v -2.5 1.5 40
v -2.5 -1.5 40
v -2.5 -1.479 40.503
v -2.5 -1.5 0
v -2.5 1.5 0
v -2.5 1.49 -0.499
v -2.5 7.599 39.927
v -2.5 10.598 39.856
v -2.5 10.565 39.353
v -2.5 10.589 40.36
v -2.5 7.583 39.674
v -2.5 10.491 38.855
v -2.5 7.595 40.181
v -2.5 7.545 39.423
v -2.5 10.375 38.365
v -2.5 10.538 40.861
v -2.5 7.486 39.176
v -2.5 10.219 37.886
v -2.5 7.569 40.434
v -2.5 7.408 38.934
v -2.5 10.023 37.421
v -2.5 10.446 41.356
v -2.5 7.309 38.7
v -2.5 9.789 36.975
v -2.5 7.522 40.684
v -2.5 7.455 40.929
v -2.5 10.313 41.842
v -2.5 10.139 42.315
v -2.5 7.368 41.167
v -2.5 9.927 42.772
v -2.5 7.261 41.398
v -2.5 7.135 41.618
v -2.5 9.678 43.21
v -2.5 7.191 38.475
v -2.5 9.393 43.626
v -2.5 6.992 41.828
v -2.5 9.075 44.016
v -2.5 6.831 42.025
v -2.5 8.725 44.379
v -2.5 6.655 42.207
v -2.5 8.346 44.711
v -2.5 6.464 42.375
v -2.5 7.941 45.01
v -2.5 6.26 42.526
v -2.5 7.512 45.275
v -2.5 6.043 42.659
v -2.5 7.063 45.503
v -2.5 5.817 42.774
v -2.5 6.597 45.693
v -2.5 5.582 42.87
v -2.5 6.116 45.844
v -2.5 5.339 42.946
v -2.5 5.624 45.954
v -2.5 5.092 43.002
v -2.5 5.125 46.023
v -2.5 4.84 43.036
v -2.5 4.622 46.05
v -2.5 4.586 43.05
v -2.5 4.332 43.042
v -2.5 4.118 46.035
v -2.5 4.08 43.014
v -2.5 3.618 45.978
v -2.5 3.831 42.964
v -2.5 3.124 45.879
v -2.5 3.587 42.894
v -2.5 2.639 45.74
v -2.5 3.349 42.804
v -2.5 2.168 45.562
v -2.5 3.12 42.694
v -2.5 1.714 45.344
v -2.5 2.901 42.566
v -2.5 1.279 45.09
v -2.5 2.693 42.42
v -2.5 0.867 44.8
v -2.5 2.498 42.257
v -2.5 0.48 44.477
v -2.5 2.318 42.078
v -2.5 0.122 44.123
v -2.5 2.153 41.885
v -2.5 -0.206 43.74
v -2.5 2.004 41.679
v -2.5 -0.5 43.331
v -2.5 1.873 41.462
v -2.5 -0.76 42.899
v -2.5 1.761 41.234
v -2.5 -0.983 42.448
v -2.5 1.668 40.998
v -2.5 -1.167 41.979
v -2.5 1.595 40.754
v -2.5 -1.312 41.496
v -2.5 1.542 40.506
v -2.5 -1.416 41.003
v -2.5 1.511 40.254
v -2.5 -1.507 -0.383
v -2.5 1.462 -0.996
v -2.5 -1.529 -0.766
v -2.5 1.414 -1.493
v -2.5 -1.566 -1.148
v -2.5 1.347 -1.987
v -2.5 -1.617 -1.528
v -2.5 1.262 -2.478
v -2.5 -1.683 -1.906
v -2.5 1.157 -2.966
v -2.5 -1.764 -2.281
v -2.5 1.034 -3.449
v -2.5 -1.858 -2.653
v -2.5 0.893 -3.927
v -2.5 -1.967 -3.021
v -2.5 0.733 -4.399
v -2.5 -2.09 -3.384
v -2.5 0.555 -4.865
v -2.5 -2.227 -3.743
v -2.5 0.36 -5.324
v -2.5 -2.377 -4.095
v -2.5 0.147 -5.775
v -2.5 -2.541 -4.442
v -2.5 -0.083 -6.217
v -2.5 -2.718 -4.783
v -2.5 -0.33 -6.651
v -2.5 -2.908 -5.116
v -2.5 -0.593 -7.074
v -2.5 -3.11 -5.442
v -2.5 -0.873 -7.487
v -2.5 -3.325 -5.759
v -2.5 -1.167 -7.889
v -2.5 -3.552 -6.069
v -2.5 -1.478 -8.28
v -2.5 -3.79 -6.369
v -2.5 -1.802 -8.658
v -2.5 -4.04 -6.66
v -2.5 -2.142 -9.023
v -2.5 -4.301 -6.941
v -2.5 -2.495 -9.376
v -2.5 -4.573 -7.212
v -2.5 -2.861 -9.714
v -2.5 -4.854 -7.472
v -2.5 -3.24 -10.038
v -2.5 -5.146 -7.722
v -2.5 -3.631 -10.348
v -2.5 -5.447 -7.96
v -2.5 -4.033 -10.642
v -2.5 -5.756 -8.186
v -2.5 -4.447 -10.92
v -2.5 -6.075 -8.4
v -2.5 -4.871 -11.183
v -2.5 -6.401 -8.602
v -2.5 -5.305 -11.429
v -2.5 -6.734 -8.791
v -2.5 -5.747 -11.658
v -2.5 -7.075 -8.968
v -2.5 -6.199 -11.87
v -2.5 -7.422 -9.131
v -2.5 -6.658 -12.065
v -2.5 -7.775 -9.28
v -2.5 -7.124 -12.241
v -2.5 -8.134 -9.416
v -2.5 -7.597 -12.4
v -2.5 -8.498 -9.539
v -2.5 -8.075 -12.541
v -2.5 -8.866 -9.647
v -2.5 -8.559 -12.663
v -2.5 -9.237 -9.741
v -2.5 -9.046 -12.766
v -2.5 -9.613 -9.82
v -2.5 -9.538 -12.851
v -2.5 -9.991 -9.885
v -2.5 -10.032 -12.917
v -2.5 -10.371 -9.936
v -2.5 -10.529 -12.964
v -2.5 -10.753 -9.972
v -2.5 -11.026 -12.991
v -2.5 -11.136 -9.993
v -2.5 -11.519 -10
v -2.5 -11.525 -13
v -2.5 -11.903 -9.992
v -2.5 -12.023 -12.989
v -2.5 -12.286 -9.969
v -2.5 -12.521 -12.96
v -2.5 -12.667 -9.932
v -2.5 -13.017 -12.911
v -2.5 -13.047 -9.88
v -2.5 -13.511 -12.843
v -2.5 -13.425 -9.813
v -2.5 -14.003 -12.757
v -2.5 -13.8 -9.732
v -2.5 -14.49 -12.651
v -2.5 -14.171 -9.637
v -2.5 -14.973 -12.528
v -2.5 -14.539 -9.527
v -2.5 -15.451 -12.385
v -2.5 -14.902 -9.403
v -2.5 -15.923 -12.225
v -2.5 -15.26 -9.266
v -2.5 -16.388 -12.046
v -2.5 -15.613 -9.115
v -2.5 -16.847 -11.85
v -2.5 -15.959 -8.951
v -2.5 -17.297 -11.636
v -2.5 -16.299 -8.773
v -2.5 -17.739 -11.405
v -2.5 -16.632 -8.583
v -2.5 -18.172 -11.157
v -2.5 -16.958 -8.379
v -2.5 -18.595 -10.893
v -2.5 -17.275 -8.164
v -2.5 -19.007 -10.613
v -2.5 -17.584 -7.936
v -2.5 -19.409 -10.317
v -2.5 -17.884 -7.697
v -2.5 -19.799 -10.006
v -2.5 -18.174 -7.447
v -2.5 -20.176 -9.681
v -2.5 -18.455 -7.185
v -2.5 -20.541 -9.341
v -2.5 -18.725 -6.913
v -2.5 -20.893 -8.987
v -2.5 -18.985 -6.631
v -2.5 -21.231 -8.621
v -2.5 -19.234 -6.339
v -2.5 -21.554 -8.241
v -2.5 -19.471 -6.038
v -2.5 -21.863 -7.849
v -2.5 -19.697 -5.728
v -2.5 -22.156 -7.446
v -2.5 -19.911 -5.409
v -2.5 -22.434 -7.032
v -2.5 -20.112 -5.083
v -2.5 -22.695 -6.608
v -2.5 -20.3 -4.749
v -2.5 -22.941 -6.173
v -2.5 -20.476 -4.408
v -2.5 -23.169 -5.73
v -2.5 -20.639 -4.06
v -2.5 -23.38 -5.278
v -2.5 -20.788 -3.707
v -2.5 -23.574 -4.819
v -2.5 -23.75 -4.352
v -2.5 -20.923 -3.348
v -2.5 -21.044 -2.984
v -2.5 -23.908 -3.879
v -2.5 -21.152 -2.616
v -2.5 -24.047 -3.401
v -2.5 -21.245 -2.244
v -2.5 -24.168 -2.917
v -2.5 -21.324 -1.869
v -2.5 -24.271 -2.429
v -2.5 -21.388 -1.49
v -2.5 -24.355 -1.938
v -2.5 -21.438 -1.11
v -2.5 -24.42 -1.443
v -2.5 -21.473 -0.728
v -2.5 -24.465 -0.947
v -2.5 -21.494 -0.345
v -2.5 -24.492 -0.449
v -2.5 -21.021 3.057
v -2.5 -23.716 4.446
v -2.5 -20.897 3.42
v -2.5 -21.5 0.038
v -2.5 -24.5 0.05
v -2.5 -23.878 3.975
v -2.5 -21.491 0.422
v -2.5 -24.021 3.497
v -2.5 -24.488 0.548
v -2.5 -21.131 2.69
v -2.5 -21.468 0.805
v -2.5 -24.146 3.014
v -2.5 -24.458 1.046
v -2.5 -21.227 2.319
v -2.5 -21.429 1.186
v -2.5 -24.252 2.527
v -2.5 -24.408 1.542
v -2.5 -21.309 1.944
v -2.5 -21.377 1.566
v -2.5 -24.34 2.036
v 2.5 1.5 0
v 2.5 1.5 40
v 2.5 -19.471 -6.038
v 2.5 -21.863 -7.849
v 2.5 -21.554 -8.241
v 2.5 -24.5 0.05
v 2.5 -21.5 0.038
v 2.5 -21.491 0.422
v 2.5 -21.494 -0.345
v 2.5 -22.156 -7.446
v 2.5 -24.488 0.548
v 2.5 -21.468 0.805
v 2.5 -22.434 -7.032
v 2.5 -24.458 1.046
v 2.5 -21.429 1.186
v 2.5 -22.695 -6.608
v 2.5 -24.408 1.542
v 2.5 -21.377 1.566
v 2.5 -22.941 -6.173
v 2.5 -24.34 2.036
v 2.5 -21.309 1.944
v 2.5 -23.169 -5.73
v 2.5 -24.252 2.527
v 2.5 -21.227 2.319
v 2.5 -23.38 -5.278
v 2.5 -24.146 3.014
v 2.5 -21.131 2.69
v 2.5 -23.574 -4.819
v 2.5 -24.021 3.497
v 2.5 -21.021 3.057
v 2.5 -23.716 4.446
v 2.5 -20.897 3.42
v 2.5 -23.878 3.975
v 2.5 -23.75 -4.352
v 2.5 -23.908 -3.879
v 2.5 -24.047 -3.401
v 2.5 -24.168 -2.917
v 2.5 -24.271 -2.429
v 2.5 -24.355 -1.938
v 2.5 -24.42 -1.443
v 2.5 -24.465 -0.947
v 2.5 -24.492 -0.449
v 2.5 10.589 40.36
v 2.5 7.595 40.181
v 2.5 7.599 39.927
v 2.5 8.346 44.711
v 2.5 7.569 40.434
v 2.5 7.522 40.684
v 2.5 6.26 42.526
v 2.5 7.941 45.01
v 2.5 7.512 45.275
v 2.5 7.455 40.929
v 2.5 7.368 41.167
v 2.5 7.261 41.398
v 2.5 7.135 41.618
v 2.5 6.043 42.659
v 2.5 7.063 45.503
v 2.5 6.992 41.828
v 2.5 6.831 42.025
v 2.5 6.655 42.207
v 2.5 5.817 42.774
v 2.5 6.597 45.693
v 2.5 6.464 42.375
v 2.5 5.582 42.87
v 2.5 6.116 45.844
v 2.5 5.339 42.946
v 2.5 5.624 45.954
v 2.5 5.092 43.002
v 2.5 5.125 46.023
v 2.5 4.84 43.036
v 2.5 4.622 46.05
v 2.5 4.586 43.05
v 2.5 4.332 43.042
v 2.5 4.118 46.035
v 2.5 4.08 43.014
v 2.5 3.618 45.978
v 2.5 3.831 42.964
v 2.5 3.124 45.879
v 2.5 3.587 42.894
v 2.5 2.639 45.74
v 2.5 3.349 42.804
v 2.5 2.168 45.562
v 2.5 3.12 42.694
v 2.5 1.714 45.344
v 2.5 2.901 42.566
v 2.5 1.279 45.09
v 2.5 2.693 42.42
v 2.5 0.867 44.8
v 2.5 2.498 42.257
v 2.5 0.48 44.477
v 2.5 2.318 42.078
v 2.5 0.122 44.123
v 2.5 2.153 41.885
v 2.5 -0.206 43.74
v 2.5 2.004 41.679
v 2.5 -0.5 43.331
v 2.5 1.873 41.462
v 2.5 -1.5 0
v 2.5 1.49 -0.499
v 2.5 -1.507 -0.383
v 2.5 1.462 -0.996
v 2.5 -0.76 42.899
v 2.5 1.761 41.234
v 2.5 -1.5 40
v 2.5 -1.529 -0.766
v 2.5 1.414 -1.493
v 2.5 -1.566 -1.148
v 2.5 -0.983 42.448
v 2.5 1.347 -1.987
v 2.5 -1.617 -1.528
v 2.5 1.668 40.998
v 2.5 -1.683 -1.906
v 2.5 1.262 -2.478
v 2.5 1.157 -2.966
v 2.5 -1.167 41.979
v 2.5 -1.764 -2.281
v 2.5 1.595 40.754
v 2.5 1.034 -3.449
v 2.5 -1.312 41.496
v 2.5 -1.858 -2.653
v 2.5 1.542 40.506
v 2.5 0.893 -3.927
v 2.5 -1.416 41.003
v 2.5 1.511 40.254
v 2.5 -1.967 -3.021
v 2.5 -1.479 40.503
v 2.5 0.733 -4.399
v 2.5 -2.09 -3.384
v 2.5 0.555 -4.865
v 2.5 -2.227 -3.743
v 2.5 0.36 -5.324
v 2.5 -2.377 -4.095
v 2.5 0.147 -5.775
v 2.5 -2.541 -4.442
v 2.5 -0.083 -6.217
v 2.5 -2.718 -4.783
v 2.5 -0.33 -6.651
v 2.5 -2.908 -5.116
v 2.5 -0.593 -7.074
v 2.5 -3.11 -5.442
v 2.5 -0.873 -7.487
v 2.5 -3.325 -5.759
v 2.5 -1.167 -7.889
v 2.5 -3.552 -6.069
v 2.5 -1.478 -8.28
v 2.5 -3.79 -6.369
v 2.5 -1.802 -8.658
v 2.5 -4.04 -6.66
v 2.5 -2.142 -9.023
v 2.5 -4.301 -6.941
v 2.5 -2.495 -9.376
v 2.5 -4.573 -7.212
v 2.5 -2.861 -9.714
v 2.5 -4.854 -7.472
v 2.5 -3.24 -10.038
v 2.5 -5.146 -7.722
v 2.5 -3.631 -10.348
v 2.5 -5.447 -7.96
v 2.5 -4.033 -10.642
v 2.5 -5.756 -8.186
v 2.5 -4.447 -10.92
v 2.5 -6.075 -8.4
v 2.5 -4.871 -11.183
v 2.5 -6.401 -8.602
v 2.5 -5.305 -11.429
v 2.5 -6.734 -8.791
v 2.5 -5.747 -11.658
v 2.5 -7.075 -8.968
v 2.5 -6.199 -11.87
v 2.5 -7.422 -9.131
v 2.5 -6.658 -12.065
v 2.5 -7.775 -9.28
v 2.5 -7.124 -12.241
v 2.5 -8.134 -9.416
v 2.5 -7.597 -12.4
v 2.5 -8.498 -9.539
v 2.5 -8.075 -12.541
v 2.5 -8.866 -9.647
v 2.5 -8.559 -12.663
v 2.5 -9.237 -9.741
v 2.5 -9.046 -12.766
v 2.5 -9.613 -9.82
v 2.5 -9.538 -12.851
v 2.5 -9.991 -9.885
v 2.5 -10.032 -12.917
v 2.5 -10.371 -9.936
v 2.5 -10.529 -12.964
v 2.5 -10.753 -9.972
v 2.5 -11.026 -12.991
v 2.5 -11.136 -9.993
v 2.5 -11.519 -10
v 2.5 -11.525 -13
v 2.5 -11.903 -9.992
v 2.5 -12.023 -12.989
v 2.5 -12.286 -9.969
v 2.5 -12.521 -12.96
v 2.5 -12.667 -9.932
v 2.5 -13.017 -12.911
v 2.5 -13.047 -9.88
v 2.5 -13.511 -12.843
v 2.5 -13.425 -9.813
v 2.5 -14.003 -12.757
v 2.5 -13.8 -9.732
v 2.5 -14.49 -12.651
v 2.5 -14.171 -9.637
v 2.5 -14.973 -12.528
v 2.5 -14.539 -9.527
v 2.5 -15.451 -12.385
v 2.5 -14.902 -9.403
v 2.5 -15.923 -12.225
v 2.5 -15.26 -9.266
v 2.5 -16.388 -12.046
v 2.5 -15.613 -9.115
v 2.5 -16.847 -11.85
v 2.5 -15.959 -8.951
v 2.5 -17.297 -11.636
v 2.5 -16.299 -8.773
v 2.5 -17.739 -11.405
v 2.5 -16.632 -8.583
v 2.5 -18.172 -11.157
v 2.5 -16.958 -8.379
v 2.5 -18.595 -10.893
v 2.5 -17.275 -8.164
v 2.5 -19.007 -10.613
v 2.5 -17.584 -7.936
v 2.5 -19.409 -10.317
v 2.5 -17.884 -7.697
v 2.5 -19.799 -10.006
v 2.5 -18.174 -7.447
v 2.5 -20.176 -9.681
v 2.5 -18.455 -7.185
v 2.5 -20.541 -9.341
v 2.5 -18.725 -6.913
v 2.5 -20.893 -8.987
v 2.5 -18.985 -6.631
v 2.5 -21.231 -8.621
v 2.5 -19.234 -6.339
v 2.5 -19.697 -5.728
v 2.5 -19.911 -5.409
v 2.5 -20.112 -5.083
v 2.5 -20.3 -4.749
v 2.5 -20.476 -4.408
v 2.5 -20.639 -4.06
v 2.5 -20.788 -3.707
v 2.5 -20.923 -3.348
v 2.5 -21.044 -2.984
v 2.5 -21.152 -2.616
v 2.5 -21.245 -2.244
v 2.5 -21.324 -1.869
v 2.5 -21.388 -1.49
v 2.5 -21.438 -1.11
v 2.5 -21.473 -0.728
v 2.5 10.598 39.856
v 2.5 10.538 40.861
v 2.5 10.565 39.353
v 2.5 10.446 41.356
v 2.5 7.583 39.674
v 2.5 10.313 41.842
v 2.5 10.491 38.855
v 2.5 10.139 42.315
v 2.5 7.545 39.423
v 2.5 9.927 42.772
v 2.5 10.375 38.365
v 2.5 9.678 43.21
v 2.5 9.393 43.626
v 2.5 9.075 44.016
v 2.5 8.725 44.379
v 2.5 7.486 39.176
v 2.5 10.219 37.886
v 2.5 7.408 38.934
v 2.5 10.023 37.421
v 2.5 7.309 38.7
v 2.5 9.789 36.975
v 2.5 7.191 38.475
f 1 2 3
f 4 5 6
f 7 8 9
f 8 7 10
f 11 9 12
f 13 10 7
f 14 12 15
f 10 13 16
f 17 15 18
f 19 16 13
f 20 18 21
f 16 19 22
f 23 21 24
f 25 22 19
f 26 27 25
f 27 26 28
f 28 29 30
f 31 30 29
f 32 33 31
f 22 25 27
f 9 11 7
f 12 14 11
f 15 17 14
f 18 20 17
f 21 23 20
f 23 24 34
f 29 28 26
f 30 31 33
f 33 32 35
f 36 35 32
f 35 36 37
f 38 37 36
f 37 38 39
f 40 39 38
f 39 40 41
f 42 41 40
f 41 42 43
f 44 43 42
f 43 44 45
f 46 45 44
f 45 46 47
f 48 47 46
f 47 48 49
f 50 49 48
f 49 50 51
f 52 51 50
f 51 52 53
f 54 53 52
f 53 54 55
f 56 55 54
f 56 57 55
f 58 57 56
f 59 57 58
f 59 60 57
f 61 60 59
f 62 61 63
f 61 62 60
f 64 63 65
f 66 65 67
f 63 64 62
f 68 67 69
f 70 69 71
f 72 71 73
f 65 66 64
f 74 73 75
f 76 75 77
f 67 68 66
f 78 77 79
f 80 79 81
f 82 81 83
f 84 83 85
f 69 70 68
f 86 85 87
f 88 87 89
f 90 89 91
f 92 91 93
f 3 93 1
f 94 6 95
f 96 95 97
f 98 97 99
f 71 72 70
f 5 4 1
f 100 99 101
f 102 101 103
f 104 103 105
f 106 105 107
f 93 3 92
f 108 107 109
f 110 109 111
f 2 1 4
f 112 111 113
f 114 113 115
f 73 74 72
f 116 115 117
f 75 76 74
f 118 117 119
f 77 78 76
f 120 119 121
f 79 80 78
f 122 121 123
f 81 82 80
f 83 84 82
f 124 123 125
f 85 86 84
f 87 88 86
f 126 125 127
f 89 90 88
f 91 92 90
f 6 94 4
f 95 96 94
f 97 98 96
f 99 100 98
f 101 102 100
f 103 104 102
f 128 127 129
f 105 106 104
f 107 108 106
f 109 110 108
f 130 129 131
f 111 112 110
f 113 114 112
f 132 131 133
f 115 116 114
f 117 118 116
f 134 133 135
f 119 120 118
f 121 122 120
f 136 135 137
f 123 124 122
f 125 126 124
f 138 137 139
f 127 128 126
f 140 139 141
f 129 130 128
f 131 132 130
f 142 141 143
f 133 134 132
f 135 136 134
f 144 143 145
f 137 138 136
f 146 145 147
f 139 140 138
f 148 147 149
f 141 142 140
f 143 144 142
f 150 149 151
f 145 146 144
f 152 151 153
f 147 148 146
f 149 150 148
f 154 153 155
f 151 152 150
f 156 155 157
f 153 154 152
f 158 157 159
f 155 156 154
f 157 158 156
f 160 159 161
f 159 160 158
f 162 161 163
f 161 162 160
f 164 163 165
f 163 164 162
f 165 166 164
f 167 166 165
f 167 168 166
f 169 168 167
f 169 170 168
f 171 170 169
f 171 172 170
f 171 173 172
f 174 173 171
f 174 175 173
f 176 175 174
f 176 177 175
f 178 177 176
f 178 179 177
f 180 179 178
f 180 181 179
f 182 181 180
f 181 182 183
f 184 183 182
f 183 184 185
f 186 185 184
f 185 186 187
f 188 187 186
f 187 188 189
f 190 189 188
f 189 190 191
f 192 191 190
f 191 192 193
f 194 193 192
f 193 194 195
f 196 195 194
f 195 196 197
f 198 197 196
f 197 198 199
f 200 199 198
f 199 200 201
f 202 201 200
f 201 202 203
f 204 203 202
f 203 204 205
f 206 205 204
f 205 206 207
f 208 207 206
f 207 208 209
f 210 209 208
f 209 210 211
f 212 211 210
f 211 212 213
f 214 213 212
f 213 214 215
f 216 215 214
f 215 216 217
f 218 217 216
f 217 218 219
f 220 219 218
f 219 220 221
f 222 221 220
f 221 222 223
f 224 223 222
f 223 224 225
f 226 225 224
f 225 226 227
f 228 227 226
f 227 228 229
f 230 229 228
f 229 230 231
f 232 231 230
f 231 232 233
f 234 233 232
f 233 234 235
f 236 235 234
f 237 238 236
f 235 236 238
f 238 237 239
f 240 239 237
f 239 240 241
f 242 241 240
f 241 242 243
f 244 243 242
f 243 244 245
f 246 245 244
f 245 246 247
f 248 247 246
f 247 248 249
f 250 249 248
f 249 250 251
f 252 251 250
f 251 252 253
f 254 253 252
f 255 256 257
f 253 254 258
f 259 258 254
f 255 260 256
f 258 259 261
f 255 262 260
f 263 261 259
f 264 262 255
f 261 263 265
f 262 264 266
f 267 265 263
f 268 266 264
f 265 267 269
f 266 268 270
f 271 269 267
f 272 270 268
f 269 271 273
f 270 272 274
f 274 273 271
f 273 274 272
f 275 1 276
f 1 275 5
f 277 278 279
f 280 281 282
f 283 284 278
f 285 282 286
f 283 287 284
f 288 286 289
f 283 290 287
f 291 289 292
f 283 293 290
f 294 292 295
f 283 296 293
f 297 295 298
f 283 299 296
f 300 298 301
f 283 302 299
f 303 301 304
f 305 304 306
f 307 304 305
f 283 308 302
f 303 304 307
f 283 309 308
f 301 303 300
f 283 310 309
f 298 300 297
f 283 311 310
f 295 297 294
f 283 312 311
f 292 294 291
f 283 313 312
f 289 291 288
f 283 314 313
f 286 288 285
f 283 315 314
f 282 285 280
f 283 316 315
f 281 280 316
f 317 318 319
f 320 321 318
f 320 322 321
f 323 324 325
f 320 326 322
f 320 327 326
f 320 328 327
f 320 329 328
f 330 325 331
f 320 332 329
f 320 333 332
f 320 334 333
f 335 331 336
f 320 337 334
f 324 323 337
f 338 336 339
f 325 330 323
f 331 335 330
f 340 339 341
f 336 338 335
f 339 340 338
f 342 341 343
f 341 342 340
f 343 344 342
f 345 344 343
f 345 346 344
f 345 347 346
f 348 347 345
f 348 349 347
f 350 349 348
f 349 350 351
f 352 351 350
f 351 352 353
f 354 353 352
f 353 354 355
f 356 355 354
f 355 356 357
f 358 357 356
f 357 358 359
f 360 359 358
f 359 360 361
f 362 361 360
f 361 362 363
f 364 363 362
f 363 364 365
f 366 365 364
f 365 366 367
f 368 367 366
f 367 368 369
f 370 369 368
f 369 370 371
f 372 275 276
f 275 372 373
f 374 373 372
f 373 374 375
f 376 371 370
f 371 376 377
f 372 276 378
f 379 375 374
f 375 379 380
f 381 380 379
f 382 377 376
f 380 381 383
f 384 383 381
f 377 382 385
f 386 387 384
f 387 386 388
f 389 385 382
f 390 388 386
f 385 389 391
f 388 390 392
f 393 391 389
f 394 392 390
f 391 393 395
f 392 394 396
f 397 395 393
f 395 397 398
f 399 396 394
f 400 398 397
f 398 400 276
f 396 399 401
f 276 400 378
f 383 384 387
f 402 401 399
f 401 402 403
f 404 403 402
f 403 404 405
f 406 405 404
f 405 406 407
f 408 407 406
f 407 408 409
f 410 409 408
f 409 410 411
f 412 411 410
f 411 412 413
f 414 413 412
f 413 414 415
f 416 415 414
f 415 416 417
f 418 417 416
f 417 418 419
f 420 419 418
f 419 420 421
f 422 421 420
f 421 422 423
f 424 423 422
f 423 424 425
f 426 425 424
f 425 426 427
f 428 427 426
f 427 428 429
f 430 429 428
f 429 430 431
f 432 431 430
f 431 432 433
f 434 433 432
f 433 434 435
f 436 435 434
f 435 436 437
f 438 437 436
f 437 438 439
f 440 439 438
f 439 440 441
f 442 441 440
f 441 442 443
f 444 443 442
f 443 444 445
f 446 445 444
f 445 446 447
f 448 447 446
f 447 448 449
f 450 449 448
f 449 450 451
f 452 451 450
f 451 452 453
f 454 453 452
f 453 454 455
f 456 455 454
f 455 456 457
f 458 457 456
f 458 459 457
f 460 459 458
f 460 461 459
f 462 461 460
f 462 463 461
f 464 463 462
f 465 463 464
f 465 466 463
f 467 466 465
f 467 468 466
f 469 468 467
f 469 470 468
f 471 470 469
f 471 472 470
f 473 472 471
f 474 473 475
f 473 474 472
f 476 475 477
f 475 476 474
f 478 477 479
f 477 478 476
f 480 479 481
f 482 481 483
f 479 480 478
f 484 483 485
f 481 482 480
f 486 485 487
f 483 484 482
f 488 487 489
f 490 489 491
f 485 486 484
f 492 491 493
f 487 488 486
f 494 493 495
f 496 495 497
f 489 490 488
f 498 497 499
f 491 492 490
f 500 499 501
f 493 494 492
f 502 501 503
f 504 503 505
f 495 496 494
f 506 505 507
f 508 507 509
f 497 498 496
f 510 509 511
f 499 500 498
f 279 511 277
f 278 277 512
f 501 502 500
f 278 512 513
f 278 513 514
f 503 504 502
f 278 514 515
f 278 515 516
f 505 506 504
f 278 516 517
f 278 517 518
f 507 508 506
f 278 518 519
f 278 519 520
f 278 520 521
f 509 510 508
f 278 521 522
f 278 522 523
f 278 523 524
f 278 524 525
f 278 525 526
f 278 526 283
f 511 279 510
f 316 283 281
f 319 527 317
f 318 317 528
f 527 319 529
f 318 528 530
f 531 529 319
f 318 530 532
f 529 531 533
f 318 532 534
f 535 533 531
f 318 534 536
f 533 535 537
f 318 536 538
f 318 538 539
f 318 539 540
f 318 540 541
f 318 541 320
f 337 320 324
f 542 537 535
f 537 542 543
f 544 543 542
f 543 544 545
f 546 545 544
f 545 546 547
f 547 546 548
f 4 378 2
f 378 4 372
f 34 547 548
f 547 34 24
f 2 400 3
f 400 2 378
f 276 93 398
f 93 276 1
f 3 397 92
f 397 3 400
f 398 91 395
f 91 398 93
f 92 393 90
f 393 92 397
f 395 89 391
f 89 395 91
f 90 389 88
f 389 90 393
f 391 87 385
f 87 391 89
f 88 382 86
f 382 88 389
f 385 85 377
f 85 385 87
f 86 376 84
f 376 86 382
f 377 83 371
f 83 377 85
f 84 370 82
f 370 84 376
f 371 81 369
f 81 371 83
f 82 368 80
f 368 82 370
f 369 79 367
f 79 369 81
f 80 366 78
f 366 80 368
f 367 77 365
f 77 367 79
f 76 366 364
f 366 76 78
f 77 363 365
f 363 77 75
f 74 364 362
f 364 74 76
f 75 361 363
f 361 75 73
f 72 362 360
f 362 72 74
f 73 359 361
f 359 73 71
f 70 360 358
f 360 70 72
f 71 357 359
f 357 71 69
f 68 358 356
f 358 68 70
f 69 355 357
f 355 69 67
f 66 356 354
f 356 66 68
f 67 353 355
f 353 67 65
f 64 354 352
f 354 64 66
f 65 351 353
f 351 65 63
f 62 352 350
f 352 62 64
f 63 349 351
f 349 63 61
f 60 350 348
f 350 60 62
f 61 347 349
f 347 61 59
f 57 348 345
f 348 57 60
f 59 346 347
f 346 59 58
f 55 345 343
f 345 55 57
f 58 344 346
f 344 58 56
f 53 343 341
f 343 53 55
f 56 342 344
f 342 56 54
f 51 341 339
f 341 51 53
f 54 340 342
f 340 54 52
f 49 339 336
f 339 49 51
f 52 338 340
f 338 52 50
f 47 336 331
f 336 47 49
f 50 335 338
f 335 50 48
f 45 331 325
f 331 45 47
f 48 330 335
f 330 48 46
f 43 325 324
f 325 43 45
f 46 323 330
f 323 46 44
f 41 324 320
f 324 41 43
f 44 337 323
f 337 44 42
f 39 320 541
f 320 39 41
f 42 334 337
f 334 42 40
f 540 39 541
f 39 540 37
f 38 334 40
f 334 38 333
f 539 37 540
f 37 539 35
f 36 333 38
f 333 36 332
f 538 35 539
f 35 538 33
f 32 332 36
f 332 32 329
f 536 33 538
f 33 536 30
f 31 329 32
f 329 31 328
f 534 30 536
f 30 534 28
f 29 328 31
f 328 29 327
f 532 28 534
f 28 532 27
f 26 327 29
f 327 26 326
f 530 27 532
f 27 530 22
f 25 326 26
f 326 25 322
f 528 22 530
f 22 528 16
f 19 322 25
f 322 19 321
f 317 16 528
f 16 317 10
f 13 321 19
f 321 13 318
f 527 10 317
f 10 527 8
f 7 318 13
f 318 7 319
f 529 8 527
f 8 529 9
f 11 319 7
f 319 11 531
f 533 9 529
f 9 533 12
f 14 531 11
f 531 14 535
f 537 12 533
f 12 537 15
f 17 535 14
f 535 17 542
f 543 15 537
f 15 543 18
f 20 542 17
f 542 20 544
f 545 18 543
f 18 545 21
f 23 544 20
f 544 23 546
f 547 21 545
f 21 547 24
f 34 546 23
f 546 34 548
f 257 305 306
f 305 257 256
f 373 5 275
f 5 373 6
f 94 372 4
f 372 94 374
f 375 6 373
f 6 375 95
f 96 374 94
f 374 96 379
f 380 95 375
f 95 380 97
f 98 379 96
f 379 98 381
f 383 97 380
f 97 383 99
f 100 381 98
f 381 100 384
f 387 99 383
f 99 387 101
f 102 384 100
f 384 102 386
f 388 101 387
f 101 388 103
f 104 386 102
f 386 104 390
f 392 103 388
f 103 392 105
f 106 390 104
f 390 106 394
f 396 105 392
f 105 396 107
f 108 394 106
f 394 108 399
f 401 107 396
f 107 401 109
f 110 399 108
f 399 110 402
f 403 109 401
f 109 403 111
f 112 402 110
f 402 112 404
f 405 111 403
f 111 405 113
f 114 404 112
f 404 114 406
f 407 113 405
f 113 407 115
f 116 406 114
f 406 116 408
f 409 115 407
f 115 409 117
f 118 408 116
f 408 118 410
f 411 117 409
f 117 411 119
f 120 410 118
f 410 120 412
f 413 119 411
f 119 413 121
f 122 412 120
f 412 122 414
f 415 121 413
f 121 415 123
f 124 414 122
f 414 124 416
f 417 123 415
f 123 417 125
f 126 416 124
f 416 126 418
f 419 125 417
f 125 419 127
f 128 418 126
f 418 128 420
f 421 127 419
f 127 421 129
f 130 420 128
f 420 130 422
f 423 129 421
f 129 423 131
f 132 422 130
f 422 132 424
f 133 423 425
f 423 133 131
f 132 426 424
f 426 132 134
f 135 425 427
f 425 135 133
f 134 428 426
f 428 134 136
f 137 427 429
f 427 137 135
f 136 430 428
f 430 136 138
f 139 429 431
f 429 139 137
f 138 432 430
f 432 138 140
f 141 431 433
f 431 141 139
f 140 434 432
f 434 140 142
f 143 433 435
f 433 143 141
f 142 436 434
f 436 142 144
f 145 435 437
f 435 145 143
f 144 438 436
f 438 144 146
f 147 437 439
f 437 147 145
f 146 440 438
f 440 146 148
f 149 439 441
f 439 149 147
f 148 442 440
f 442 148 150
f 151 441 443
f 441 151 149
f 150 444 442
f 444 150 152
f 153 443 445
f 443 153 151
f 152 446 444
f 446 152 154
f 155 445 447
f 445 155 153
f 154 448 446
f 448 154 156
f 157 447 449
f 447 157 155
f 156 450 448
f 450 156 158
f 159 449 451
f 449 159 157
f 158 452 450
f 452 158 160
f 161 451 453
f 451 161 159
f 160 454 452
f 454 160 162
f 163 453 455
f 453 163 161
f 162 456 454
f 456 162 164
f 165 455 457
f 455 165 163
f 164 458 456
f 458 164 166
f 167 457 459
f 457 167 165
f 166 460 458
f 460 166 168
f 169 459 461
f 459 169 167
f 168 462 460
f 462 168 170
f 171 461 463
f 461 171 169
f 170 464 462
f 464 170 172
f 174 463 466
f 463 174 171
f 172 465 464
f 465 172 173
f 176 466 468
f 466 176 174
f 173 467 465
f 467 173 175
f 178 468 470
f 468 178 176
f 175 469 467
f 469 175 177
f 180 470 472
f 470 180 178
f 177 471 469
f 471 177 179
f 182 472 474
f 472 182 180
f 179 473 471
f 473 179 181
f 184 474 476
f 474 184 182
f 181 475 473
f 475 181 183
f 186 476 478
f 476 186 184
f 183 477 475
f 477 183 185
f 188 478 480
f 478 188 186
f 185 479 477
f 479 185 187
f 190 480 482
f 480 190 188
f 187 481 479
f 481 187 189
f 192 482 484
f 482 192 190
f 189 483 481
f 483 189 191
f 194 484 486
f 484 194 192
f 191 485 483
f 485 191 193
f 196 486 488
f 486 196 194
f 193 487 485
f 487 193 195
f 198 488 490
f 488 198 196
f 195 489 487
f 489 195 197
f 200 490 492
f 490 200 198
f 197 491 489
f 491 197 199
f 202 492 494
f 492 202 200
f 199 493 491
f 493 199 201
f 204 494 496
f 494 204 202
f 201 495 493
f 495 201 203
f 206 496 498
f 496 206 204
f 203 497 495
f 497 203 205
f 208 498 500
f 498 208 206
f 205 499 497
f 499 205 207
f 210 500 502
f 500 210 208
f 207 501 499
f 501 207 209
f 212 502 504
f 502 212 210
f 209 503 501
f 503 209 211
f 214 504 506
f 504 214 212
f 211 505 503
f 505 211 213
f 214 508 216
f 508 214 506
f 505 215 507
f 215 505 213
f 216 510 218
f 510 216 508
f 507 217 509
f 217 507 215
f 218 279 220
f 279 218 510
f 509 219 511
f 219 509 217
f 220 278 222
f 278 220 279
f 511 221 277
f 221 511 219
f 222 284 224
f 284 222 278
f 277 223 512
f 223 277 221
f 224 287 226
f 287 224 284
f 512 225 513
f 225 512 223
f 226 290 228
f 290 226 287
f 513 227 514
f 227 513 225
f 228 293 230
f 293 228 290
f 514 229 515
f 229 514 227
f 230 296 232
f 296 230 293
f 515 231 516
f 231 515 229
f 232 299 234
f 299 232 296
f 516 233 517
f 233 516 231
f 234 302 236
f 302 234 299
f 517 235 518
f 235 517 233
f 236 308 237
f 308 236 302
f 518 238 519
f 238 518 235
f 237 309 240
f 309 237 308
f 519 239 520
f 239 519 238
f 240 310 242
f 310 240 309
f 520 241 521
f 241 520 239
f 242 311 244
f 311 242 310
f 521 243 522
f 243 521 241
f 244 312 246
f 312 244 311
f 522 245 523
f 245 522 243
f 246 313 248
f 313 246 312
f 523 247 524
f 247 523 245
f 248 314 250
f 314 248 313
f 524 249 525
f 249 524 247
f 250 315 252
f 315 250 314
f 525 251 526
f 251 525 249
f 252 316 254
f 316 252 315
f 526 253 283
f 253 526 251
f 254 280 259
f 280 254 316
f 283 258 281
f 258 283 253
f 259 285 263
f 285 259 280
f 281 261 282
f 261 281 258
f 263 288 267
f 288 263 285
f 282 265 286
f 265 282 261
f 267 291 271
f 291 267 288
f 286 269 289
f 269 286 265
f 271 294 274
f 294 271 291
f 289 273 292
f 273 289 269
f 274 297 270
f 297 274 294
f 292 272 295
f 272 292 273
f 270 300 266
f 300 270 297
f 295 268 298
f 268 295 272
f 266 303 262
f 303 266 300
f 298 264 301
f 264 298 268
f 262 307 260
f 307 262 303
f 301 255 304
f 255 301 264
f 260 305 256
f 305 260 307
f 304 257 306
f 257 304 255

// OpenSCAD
width=5;
depth=3;
length=40; // of the straight part

top_diameter=6.1;  //6.1mm for the thick bars, 3.3mm for the thin ones
top_angle=210;

bottom_diameter=20;
bottom_angle=200;

$fa=1;
$fs=0.5;

module center() {
  linear_extrude(length)
  square([width,depth],true);
};

module top() {
  translate([width/2,top_diameter/2+depth/2,length])
  rotate([90,0,-90])
  rotate_extrude(angle=top_angle) {
    translate([top_diameter/2,0,0])
    square([depth,width],false);
  }
}; 

module bottom() {
  translate([width/2,-bottom_diameter/2-depth/2,0])
  rotate([-90,0,90])
  rotate_extrude(angle=bottom_angle) {
    translate([bottom_diameter/2,0,0])
    square([depth,width],false);
  }
};

center();
top();
bottom();
